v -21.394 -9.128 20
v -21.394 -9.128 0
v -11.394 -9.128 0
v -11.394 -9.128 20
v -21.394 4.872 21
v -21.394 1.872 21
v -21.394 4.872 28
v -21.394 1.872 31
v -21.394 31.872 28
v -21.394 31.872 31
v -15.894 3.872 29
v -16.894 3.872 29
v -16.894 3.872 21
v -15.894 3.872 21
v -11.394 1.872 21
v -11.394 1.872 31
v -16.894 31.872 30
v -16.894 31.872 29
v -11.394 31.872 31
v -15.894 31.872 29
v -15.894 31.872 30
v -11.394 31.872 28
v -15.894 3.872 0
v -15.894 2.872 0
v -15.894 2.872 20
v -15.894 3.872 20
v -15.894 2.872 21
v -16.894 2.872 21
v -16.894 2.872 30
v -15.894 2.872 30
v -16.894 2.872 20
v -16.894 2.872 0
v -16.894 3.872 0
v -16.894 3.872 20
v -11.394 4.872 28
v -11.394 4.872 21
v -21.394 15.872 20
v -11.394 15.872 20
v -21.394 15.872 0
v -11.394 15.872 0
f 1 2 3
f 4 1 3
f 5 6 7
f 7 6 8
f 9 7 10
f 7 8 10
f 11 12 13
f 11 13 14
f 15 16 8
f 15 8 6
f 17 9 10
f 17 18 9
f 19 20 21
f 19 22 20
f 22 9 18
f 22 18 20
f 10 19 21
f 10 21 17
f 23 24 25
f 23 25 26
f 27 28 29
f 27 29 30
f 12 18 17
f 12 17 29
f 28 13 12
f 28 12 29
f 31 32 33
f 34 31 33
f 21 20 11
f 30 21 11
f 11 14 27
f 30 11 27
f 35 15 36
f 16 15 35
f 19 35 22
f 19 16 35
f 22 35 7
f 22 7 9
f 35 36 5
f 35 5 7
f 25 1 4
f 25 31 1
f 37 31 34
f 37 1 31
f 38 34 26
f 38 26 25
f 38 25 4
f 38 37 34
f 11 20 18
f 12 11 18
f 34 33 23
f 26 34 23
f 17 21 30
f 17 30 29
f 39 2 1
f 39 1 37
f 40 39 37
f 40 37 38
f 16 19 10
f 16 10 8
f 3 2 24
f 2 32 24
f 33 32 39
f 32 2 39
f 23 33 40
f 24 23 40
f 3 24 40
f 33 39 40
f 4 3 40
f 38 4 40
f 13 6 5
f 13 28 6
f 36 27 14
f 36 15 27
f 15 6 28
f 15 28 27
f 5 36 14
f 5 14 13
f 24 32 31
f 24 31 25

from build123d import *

# Parameters (mm, degrees)
F0_W     = 10
F0_H     = 25
F0_W_2   = 1
F0_H_2   = 1
F1_DEPTH = 20
F2_W     = 27
F2_H     = 3
F3_DEPTH = 10
F4_W     = 1
F4_H     = 1
F5_DEPTH = 9
F6_W     = 1
F6_H     = 1
F7_DEPTH = 29


with BuildPart() as f1:
    # F0 (on Top) → F1 (new body)
    with BuildSketch(Plane.XY):
        with Locations((-16.393679, 3.371647)):
            Rectangle(F0_W, F0_H)
        with Locations((-16.393679, 3.371647)):
            Rectangle(F0_W_2, F0_H_2, mode=Mode.SUBTRACT)
    extrude(amount=F1_DEPTH)


with BuildPart() as f3:
    # F2 (on face) → F3 (new body)
    with BuildSketch(Plane.YZ.offset(-11.393679)):
        Polygon((1.871647, 31), (1.871647, 21), (4.871647, 21), (4.871647, 28), (4.871647, 31), align=None)
        with Locations((18.371647, 29.5)):
            Rectangle(F2_W, F2_H)
    extrude(amount=-F3_DEPTH)

    # F4 (on face) → F5 (cut)
    with BuildSketch(Plane(origin=(0, 0, 21), x_dir=(1, 0, 0), z_dir=(0, 0, -1))):
        with Locations((-16.393679, -3.371647)):
            Rectangle(F4_W, F4_H)
    extrude(amount=-F5_DEPTH, mode=Mode.SUBTRACT)

    # F6 (on face) → F7 (cut)
    with BuildSketch(Plane(origin=(0, 31.871647, 0), x_dir=(-1, 0, 0), z_dir=(0, 1, 0))):
        with Locations((16.393679, 29.5)):
            Rectangle(F6_W, F6_H)
    extrude(amount=-F7_DEPTH, mode=Mode.SUBTRACT)


solid = Compound([f1.part, f3.part])
